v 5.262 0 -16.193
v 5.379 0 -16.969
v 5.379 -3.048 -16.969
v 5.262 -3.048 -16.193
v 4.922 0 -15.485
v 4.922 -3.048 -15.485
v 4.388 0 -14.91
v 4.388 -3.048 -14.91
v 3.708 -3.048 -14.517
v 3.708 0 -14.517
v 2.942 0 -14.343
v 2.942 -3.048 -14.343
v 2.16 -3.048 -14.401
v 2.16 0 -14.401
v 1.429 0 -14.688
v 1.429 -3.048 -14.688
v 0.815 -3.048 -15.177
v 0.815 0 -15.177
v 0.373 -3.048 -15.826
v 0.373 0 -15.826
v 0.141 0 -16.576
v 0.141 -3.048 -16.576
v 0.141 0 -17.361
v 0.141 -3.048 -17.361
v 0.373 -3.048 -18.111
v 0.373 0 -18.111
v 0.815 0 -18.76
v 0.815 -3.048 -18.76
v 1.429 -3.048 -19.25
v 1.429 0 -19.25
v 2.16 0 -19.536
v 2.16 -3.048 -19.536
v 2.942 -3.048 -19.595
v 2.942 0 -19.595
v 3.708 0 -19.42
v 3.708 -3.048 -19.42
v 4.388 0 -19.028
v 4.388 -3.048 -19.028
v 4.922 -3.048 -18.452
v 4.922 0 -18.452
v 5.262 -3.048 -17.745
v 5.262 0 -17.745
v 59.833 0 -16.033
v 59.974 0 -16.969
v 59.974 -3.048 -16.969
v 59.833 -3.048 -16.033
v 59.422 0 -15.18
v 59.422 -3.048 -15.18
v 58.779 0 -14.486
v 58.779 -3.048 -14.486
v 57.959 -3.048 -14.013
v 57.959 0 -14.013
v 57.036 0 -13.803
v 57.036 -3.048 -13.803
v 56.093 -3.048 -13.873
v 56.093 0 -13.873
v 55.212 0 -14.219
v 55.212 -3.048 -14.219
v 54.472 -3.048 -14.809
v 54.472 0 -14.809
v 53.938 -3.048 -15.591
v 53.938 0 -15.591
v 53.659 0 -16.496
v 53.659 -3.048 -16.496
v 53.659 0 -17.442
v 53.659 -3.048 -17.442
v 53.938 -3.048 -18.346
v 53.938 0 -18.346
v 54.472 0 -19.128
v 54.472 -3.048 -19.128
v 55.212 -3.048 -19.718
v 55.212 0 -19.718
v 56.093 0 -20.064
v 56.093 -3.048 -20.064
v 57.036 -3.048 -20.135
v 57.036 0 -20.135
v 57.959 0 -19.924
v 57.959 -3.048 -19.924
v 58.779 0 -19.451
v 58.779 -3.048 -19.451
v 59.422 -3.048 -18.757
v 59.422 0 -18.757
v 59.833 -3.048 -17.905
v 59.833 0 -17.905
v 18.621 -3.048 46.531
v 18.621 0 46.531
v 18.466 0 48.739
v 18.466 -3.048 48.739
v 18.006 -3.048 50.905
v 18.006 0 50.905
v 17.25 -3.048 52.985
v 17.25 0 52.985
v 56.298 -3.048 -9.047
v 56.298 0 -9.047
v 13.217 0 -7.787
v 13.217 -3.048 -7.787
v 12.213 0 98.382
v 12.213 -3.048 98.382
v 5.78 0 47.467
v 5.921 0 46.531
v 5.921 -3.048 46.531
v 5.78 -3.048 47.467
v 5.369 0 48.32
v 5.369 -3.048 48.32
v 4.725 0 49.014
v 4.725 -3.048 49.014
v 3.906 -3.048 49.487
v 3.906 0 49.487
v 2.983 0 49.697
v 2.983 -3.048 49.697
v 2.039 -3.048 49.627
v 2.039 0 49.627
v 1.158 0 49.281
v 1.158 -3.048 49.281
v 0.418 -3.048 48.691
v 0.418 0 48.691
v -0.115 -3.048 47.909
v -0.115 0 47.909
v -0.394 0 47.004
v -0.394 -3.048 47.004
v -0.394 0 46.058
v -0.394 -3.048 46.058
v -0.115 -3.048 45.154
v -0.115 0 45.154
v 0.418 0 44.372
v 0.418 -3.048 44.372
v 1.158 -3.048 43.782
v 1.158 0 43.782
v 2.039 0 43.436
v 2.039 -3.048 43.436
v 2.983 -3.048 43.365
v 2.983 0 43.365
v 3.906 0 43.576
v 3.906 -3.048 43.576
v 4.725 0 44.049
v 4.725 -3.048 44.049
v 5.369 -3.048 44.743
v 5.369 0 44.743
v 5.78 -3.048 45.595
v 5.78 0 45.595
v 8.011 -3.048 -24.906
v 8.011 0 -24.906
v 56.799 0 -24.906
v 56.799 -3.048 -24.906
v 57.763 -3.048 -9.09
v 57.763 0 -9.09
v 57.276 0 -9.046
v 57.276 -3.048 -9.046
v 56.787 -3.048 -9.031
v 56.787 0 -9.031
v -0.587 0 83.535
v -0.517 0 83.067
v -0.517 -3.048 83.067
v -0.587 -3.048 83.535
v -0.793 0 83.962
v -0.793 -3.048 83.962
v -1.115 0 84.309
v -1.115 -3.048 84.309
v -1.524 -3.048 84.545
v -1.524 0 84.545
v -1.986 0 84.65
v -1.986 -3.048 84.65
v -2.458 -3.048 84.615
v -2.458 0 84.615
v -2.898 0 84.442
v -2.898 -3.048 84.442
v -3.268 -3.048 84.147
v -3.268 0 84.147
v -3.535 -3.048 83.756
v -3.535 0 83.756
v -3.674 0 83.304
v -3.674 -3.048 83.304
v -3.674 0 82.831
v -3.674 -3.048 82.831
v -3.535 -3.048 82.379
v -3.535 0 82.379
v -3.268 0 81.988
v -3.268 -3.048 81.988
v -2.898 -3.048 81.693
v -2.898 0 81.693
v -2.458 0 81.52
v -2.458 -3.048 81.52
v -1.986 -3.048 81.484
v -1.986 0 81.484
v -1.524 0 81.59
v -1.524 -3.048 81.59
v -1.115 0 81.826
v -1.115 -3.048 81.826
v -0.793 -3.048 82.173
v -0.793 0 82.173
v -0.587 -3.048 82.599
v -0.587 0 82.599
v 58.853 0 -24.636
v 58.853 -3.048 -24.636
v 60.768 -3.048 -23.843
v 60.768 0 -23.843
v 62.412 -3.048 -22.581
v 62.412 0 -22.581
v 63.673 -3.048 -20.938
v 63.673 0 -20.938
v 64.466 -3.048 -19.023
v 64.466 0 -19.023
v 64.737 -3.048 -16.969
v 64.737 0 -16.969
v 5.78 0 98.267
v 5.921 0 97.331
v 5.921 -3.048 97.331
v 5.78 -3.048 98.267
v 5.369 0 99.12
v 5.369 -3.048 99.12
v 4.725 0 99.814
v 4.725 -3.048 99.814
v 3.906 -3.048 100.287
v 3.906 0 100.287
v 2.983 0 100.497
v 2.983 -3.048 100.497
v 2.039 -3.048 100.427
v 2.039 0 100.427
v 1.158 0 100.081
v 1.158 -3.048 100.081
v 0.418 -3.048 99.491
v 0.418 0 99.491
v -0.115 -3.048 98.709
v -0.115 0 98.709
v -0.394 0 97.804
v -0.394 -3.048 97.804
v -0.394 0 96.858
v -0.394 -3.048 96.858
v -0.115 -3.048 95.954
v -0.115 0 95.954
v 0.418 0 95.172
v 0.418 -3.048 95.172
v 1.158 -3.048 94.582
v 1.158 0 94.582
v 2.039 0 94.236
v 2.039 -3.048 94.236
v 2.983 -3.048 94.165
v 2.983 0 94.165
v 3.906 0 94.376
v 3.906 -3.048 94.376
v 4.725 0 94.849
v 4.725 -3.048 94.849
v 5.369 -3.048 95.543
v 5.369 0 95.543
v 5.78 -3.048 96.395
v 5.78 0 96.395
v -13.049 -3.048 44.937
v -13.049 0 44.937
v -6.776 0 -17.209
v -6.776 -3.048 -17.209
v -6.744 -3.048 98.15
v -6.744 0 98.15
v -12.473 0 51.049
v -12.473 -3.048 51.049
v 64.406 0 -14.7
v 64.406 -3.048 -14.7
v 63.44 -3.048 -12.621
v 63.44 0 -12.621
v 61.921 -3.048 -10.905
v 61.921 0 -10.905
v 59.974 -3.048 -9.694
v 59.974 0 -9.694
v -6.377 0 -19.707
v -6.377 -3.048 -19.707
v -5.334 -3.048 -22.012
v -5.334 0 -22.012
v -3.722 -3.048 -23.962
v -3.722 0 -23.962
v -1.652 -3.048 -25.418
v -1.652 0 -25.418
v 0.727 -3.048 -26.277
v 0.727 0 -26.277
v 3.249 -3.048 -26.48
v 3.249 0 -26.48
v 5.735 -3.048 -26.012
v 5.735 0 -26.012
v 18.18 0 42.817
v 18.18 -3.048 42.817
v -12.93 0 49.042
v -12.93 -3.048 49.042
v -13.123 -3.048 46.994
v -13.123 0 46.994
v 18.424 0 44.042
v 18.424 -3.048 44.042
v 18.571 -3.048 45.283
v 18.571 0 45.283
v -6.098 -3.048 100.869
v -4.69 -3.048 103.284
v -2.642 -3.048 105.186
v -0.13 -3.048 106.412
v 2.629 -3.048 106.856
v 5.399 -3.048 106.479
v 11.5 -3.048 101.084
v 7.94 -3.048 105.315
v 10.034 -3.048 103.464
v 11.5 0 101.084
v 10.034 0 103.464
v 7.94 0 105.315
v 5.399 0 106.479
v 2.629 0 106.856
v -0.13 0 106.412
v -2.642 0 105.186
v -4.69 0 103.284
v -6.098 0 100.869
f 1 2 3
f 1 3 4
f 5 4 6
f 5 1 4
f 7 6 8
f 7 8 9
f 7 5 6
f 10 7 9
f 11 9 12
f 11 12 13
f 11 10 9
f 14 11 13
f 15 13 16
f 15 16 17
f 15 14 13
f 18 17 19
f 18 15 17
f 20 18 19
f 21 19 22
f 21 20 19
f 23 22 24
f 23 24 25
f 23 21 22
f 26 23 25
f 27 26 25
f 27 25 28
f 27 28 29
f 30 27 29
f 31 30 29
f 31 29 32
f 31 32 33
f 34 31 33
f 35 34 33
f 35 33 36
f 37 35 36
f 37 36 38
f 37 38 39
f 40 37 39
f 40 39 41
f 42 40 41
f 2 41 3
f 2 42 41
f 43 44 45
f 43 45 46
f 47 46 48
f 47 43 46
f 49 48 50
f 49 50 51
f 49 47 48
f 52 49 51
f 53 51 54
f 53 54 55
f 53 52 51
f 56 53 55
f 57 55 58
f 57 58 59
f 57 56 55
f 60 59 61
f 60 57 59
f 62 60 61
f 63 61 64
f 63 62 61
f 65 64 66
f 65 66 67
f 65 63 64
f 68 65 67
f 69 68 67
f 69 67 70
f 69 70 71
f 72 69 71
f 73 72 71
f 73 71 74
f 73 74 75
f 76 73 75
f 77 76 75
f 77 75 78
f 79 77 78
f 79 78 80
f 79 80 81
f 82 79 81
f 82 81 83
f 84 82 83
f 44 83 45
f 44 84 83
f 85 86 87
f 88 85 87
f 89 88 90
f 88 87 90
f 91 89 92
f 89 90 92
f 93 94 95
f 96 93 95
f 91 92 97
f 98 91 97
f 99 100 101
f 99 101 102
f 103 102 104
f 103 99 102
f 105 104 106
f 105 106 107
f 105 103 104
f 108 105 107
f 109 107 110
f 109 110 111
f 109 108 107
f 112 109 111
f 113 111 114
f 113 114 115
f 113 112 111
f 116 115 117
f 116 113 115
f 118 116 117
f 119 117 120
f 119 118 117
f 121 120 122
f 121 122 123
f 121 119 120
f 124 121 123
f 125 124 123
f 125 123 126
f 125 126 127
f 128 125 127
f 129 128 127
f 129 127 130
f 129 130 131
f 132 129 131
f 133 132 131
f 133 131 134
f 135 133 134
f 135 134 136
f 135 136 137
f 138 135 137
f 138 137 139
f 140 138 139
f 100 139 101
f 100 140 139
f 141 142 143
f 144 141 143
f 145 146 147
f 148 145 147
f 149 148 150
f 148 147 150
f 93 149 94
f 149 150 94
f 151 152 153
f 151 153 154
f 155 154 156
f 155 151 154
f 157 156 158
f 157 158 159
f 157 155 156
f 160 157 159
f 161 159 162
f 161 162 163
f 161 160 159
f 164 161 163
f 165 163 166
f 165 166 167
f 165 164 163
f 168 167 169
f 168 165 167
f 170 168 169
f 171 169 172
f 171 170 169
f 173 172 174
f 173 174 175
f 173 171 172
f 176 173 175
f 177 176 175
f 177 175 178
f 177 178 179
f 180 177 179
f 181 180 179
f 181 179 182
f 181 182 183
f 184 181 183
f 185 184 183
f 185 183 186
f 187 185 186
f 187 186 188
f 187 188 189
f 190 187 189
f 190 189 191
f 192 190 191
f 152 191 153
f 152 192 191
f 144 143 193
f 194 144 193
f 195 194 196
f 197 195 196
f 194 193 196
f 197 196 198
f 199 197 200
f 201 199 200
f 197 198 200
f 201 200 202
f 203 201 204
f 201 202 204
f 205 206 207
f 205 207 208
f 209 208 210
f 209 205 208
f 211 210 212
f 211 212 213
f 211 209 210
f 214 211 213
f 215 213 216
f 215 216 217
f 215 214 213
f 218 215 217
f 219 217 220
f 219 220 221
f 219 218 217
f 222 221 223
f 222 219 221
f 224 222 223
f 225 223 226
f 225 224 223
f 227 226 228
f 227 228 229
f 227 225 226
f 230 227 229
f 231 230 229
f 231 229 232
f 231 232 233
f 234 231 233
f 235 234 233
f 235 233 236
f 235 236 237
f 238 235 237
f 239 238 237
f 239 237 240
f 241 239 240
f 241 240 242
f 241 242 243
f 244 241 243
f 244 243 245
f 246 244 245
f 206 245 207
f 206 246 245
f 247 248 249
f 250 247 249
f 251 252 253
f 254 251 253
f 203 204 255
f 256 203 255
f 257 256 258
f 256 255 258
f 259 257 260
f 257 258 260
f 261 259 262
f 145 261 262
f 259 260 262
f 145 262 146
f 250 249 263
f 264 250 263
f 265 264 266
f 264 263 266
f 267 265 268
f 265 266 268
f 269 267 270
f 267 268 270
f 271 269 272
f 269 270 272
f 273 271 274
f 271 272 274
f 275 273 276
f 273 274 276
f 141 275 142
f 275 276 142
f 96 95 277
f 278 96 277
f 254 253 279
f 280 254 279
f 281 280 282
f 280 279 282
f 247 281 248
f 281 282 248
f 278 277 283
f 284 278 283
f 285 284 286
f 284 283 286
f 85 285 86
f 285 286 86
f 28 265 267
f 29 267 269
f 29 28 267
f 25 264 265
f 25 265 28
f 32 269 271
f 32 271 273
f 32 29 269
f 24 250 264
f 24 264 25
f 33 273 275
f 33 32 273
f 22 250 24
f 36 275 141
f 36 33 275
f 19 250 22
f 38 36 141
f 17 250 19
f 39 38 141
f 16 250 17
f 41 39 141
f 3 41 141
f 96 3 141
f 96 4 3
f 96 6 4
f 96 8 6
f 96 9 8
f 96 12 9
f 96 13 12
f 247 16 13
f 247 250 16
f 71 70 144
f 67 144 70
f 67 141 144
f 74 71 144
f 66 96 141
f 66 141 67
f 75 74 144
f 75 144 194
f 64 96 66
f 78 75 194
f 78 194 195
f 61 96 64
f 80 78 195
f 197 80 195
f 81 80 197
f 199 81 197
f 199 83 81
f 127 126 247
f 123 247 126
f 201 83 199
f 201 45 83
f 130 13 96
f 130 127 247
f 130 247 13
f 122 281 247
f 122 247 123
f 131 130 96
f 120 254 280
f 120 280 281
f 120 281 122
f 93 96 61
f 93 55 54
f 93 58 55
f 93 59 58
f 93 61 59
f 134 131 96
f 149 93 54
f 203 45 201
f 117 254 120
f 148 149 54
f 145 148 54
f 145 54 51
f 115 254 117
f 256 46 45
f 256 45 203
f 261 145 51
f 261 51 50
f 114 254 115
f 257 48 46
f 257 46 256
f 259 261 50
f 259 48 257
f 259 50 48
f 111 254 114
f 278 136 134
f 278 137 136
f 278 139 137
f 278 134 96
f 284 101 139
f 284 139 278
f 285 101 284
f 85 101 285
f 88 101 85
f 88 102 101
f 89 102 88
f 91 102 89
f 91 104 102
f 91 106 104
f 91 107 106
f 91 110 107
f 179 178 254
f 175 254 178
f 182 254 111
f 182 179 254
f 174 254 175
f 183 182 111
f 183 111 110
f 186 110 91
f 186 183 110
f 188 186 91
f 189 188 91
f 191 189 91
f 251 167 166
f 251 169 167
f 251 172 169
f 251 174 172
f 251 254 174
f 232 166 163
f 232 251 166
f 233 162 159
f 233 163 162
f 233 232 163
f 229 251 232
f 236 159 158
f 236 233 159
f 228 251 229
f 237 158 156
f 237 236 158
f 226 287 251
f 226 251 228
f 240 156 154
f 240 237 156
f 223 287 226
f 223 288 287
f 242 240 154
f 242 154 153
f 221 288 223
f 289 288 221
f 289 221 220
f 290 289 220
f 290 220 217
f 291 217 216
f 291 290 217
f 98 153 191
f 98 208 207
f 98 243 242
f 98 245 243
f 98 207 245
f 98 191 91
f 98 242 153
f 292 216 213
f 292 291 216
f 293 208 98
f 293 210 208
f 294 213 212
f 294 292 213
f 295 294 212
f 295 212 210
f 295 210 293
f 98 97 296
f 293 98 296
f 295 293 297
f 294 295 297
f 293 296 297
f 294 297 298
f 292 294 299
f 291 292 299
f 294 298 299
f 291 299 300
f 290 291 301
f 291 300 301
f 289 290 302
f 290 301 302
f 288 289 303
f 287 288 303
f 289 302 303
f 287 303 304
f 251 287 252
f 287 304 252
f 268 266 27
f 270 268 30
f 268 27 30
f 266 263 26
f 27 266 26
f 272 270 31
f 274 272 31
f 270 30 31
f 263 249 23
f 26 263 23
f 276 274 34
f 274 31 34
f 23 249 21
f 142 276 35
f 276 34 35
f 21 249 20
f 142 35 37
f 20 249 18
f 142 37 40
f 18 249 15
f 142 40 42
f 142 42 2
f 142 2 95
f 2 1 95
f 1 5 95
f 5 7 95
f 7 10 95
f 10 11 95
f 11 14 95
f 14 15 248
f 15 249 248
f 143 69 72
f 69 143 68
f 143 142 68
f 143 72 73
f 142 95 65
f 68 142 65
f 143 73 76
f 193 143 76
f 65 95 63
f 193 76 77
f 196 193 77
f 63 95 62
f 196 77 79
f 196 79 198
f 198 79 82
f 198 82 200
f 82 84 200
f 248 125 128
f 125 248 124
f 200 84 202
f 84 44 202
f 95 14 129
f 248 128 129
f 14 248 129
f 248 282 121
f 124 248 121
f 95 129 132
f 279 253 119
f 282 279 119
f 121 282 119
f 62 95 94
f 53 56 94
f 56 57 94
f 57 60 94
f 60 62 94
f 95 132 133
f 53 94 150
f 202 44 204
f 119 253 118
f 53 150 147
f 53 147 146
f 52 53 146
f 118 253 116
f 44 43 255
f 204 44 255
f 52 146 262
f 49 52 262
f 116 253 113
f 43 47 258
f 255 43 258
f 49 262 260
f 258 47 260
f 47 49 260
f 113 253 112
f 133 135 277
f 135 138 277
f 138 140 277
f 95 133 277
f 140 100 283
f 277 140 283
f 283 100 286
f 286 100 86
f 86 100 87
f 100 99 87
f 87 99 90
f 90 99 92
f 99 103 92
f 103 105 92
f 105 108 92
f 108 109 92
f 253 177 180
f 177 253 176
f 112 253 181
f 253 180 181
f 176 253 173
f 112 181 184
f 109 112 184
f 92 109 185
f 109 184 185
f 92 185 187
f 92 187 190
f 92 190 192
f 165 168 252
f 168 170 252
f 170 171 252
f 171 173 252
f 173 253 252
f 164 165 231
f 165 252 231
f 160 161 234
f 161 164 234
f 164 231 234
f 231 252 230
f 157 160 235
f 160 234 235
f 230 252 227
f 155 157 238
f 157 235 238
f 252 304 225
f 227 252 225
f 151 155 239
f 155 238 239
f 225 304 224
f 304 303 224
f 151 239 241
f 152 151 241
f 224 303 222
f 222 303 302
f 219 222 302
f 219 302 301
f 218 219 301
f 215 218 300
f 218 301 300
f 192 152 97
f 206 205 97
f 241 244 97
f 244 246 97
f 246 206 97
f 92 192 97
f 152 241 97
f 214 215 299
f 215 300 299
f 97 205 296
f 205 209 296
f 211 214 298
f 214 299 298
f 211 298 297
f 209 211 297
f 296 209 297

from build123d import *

# Parameters (mm, degrees)
F0_R     = 3.175
F0_R_2   = 2.6335759293
F0_R_3   = 1.5875
F1_DEPTH = 3.048


with BuildPart() as f1:
    # F0 (on Front) → F1 (new body)
    with BuildSketch(Plane.XZ):
        with BuildLine():
            ThreePointArc((56.7990275078, -24.9062731053), (62.4116875835, -22.581433181), (64.7365275078, -16.9687731053))
            ThreePointArc((64.7365275078, -16.9687731053), (62.7426623776, -11.707869116), (57.7627673101, -9.0899970681))
            Line((57.7627673101, -9.0899970681), (56.297547037, -9.0471303724))
            ThreePointArc((56.297547037, -9.0471303724), (48.8654928151, -17.2196386647), (56.7990275078, -24.9062731053))
        make_face()
        with Locations((56.7990275078, -16.9687731053)):
            Circle(F0_R, mode=Mode.SUBTRACT)
        with BuildLine():
            Line((56.297547037, -9.0471303724), (57.7627673101, -9.0899970681))
            ThreePointArc((57.7627673101, -9.0899970681), (57.0311488355, -9.0346678666), (56.297547037, -9.0471303724))
        make_face()
        with BuildLine():
            Line((8.0107625365, -24.9062731053), (56.7990275078, -24.9062731053))
            ThreePointArc((56.7990275078, -24.9062731053), (48.8654928151, -17.2196386647), (56.297547037, -9.0471303724))
            Line((56.297547037, -9.0471303724), (13.2168797338, -7.7867561536))
            Line((13.2168797338, -7.7867561536), (12.2251364065, -17.8985078123))
            ThreePointArc((12.2251364065, -17.8985078123), (10.9082443644, -21.8776629611), (8.0107625365, -24.9062731053))
        make_face()
        with BuildLine():
            ThreePointArc((-6.7763501221, -17.208975122), (-1.652361496, -25.4176415362), (8.0107625365, -24.9062731053))
            ThreePointArc((8.0107625365, -24.9062731053), (10.9082443644, -21.8776629611), (12.2251364065, -17.8985078123))
            ThreePointArc((12.2251364065, -17.8985078123), (12.2592428174, -17.4341964193), (12.2706206818, -16.9687731053))
            ThreePointArc((12.2706206818, -16.9687731053), (9.8779825256, -10.6556883181), (3.9021084446, -7.5142418607))
            ThreePointArc((3.9021084446, -7.5142418607), (-3.6569014681, -9.9165865564), (-6.7763501221, -17.208975122))
        make_face()
        with Locations((2.7456206818, -16.9687731053)):
            Circle(F0_R_2, mode=Mode.SUBTRACT)
        with BuildLine():
            Line((3.9021084446, -7.5142418607), (13.2168797338, -7.7867561536))
            Line((13.2168797338, -7.7867561536), (18.1800145925, 42.8170500531))
            ThreePointArc((18.1800145925, 42.8170500531), (1.6704584717, 30.6926773645), (-13.0491238986, 44.9369657372))
            Line((-13.0491238986, 44.9369657372), (-6.7763501221, -17.208975122))
            ThreePointArc((-6.7763501221, -17.208975122), (-3.6569014681, -9.9165865564), (3.9021084446, -7.5142418607))
        make_face()
        with BuildLine():
            Line((12.2251364065, -17.8985078123), (13.2168797338, -7.7867561536))
            Line((13.2168797338, -7.7867561536), (3.9021084446, -7.5142418607))
            ThreePointArc((3.9021084446, -7.5142418607), (9.8779825256, -10.6556883181), (12.2706206818, -16.9687731053))
            ThreePointArc((12.2706206818, -16.9687731053), (12.2592428174, -17.4341964193), (12.2251364065, -17.8985078123))
        make_face()
        with BuildLine():
            ThreePointArc((-13.0491238986, 44.9369657372), (1.6704584717, 30.6926773645), (18.1800145925, 42.8170500531))
            ThreePointArc((18.1800145925, 42.8170500531), (18.5100843316, 44.6611170492), (18.6206206818, 46.5312268947))
            ThreePointArc((18.6206206818, 46.5312268947), (18.2740618453, 49.830187342), (17.2495164257, 52.9851120231))
            ThreePointArc((17.2495164257, 52.9851120231), (1.7136407932, 62.3726486273), (-12.4730077607, 51.0488560659))
            ThreePointArc((-12.4730077607, 51.0488560659), (-13.0593192868, 48.0210247289), (-13.0491238986, 44.9369657372))
        make_face()
        with Locations((2.7456206818, 46.5312268947)):
            Circle(F0_R, mode=Mode.SUBTRACT)
        with BuildLine():
            Line((-6.7441452961, 98.1497418202), (-12.4730077607, 51.0488560659))
            ThreePointArc((-12.4730077607, 51.0488560659), (1.7136407932, 62.3726486273), (17.2495164257, 52.9851120231))
            Line((17.2495164257, 52.9851120231), (12.2125248757, 98.3816315712))
            ThreePointArc((12.2125248757, 98.3816315712), (12.2560856402, 97.8572319106), (12.2706206818, 97.3312268947))
            ThreePointArc((12.2706206818, 97.3312268947), (2.3359842212, 87.8150394769), (-6.7441452961, 98.1497418202))
        make_face()
        with Locations((-2.1043515299, 83.0673798919)):
            Circle(F0_R_3, mode=Mode.SUBTRACT)
        with BuildLine():
            ThreePointArc((12.2125248757, 98.3816315712), (2.6291136887, 106.8555143284), (-6.7441452961, 98.1497418202))
            ThreePointArc((-6.7441452961, 98.1497418202), (2.3359842212, 87.8150394769), (12.2706206818, 97.3312268947))
            ThreePointArc((12.2706206818, 97.3312268947), (12.2560856402, 97.8572319106), (12.2125248757, 98.3816315712))
        make_face()
        with Locations((2.7456206818, 97.3312268947)):
            Circle(F0_R, mode=Mode.SUBTRACT)
    extrude(amount=F1_DEPTH)


solid = f1.part
